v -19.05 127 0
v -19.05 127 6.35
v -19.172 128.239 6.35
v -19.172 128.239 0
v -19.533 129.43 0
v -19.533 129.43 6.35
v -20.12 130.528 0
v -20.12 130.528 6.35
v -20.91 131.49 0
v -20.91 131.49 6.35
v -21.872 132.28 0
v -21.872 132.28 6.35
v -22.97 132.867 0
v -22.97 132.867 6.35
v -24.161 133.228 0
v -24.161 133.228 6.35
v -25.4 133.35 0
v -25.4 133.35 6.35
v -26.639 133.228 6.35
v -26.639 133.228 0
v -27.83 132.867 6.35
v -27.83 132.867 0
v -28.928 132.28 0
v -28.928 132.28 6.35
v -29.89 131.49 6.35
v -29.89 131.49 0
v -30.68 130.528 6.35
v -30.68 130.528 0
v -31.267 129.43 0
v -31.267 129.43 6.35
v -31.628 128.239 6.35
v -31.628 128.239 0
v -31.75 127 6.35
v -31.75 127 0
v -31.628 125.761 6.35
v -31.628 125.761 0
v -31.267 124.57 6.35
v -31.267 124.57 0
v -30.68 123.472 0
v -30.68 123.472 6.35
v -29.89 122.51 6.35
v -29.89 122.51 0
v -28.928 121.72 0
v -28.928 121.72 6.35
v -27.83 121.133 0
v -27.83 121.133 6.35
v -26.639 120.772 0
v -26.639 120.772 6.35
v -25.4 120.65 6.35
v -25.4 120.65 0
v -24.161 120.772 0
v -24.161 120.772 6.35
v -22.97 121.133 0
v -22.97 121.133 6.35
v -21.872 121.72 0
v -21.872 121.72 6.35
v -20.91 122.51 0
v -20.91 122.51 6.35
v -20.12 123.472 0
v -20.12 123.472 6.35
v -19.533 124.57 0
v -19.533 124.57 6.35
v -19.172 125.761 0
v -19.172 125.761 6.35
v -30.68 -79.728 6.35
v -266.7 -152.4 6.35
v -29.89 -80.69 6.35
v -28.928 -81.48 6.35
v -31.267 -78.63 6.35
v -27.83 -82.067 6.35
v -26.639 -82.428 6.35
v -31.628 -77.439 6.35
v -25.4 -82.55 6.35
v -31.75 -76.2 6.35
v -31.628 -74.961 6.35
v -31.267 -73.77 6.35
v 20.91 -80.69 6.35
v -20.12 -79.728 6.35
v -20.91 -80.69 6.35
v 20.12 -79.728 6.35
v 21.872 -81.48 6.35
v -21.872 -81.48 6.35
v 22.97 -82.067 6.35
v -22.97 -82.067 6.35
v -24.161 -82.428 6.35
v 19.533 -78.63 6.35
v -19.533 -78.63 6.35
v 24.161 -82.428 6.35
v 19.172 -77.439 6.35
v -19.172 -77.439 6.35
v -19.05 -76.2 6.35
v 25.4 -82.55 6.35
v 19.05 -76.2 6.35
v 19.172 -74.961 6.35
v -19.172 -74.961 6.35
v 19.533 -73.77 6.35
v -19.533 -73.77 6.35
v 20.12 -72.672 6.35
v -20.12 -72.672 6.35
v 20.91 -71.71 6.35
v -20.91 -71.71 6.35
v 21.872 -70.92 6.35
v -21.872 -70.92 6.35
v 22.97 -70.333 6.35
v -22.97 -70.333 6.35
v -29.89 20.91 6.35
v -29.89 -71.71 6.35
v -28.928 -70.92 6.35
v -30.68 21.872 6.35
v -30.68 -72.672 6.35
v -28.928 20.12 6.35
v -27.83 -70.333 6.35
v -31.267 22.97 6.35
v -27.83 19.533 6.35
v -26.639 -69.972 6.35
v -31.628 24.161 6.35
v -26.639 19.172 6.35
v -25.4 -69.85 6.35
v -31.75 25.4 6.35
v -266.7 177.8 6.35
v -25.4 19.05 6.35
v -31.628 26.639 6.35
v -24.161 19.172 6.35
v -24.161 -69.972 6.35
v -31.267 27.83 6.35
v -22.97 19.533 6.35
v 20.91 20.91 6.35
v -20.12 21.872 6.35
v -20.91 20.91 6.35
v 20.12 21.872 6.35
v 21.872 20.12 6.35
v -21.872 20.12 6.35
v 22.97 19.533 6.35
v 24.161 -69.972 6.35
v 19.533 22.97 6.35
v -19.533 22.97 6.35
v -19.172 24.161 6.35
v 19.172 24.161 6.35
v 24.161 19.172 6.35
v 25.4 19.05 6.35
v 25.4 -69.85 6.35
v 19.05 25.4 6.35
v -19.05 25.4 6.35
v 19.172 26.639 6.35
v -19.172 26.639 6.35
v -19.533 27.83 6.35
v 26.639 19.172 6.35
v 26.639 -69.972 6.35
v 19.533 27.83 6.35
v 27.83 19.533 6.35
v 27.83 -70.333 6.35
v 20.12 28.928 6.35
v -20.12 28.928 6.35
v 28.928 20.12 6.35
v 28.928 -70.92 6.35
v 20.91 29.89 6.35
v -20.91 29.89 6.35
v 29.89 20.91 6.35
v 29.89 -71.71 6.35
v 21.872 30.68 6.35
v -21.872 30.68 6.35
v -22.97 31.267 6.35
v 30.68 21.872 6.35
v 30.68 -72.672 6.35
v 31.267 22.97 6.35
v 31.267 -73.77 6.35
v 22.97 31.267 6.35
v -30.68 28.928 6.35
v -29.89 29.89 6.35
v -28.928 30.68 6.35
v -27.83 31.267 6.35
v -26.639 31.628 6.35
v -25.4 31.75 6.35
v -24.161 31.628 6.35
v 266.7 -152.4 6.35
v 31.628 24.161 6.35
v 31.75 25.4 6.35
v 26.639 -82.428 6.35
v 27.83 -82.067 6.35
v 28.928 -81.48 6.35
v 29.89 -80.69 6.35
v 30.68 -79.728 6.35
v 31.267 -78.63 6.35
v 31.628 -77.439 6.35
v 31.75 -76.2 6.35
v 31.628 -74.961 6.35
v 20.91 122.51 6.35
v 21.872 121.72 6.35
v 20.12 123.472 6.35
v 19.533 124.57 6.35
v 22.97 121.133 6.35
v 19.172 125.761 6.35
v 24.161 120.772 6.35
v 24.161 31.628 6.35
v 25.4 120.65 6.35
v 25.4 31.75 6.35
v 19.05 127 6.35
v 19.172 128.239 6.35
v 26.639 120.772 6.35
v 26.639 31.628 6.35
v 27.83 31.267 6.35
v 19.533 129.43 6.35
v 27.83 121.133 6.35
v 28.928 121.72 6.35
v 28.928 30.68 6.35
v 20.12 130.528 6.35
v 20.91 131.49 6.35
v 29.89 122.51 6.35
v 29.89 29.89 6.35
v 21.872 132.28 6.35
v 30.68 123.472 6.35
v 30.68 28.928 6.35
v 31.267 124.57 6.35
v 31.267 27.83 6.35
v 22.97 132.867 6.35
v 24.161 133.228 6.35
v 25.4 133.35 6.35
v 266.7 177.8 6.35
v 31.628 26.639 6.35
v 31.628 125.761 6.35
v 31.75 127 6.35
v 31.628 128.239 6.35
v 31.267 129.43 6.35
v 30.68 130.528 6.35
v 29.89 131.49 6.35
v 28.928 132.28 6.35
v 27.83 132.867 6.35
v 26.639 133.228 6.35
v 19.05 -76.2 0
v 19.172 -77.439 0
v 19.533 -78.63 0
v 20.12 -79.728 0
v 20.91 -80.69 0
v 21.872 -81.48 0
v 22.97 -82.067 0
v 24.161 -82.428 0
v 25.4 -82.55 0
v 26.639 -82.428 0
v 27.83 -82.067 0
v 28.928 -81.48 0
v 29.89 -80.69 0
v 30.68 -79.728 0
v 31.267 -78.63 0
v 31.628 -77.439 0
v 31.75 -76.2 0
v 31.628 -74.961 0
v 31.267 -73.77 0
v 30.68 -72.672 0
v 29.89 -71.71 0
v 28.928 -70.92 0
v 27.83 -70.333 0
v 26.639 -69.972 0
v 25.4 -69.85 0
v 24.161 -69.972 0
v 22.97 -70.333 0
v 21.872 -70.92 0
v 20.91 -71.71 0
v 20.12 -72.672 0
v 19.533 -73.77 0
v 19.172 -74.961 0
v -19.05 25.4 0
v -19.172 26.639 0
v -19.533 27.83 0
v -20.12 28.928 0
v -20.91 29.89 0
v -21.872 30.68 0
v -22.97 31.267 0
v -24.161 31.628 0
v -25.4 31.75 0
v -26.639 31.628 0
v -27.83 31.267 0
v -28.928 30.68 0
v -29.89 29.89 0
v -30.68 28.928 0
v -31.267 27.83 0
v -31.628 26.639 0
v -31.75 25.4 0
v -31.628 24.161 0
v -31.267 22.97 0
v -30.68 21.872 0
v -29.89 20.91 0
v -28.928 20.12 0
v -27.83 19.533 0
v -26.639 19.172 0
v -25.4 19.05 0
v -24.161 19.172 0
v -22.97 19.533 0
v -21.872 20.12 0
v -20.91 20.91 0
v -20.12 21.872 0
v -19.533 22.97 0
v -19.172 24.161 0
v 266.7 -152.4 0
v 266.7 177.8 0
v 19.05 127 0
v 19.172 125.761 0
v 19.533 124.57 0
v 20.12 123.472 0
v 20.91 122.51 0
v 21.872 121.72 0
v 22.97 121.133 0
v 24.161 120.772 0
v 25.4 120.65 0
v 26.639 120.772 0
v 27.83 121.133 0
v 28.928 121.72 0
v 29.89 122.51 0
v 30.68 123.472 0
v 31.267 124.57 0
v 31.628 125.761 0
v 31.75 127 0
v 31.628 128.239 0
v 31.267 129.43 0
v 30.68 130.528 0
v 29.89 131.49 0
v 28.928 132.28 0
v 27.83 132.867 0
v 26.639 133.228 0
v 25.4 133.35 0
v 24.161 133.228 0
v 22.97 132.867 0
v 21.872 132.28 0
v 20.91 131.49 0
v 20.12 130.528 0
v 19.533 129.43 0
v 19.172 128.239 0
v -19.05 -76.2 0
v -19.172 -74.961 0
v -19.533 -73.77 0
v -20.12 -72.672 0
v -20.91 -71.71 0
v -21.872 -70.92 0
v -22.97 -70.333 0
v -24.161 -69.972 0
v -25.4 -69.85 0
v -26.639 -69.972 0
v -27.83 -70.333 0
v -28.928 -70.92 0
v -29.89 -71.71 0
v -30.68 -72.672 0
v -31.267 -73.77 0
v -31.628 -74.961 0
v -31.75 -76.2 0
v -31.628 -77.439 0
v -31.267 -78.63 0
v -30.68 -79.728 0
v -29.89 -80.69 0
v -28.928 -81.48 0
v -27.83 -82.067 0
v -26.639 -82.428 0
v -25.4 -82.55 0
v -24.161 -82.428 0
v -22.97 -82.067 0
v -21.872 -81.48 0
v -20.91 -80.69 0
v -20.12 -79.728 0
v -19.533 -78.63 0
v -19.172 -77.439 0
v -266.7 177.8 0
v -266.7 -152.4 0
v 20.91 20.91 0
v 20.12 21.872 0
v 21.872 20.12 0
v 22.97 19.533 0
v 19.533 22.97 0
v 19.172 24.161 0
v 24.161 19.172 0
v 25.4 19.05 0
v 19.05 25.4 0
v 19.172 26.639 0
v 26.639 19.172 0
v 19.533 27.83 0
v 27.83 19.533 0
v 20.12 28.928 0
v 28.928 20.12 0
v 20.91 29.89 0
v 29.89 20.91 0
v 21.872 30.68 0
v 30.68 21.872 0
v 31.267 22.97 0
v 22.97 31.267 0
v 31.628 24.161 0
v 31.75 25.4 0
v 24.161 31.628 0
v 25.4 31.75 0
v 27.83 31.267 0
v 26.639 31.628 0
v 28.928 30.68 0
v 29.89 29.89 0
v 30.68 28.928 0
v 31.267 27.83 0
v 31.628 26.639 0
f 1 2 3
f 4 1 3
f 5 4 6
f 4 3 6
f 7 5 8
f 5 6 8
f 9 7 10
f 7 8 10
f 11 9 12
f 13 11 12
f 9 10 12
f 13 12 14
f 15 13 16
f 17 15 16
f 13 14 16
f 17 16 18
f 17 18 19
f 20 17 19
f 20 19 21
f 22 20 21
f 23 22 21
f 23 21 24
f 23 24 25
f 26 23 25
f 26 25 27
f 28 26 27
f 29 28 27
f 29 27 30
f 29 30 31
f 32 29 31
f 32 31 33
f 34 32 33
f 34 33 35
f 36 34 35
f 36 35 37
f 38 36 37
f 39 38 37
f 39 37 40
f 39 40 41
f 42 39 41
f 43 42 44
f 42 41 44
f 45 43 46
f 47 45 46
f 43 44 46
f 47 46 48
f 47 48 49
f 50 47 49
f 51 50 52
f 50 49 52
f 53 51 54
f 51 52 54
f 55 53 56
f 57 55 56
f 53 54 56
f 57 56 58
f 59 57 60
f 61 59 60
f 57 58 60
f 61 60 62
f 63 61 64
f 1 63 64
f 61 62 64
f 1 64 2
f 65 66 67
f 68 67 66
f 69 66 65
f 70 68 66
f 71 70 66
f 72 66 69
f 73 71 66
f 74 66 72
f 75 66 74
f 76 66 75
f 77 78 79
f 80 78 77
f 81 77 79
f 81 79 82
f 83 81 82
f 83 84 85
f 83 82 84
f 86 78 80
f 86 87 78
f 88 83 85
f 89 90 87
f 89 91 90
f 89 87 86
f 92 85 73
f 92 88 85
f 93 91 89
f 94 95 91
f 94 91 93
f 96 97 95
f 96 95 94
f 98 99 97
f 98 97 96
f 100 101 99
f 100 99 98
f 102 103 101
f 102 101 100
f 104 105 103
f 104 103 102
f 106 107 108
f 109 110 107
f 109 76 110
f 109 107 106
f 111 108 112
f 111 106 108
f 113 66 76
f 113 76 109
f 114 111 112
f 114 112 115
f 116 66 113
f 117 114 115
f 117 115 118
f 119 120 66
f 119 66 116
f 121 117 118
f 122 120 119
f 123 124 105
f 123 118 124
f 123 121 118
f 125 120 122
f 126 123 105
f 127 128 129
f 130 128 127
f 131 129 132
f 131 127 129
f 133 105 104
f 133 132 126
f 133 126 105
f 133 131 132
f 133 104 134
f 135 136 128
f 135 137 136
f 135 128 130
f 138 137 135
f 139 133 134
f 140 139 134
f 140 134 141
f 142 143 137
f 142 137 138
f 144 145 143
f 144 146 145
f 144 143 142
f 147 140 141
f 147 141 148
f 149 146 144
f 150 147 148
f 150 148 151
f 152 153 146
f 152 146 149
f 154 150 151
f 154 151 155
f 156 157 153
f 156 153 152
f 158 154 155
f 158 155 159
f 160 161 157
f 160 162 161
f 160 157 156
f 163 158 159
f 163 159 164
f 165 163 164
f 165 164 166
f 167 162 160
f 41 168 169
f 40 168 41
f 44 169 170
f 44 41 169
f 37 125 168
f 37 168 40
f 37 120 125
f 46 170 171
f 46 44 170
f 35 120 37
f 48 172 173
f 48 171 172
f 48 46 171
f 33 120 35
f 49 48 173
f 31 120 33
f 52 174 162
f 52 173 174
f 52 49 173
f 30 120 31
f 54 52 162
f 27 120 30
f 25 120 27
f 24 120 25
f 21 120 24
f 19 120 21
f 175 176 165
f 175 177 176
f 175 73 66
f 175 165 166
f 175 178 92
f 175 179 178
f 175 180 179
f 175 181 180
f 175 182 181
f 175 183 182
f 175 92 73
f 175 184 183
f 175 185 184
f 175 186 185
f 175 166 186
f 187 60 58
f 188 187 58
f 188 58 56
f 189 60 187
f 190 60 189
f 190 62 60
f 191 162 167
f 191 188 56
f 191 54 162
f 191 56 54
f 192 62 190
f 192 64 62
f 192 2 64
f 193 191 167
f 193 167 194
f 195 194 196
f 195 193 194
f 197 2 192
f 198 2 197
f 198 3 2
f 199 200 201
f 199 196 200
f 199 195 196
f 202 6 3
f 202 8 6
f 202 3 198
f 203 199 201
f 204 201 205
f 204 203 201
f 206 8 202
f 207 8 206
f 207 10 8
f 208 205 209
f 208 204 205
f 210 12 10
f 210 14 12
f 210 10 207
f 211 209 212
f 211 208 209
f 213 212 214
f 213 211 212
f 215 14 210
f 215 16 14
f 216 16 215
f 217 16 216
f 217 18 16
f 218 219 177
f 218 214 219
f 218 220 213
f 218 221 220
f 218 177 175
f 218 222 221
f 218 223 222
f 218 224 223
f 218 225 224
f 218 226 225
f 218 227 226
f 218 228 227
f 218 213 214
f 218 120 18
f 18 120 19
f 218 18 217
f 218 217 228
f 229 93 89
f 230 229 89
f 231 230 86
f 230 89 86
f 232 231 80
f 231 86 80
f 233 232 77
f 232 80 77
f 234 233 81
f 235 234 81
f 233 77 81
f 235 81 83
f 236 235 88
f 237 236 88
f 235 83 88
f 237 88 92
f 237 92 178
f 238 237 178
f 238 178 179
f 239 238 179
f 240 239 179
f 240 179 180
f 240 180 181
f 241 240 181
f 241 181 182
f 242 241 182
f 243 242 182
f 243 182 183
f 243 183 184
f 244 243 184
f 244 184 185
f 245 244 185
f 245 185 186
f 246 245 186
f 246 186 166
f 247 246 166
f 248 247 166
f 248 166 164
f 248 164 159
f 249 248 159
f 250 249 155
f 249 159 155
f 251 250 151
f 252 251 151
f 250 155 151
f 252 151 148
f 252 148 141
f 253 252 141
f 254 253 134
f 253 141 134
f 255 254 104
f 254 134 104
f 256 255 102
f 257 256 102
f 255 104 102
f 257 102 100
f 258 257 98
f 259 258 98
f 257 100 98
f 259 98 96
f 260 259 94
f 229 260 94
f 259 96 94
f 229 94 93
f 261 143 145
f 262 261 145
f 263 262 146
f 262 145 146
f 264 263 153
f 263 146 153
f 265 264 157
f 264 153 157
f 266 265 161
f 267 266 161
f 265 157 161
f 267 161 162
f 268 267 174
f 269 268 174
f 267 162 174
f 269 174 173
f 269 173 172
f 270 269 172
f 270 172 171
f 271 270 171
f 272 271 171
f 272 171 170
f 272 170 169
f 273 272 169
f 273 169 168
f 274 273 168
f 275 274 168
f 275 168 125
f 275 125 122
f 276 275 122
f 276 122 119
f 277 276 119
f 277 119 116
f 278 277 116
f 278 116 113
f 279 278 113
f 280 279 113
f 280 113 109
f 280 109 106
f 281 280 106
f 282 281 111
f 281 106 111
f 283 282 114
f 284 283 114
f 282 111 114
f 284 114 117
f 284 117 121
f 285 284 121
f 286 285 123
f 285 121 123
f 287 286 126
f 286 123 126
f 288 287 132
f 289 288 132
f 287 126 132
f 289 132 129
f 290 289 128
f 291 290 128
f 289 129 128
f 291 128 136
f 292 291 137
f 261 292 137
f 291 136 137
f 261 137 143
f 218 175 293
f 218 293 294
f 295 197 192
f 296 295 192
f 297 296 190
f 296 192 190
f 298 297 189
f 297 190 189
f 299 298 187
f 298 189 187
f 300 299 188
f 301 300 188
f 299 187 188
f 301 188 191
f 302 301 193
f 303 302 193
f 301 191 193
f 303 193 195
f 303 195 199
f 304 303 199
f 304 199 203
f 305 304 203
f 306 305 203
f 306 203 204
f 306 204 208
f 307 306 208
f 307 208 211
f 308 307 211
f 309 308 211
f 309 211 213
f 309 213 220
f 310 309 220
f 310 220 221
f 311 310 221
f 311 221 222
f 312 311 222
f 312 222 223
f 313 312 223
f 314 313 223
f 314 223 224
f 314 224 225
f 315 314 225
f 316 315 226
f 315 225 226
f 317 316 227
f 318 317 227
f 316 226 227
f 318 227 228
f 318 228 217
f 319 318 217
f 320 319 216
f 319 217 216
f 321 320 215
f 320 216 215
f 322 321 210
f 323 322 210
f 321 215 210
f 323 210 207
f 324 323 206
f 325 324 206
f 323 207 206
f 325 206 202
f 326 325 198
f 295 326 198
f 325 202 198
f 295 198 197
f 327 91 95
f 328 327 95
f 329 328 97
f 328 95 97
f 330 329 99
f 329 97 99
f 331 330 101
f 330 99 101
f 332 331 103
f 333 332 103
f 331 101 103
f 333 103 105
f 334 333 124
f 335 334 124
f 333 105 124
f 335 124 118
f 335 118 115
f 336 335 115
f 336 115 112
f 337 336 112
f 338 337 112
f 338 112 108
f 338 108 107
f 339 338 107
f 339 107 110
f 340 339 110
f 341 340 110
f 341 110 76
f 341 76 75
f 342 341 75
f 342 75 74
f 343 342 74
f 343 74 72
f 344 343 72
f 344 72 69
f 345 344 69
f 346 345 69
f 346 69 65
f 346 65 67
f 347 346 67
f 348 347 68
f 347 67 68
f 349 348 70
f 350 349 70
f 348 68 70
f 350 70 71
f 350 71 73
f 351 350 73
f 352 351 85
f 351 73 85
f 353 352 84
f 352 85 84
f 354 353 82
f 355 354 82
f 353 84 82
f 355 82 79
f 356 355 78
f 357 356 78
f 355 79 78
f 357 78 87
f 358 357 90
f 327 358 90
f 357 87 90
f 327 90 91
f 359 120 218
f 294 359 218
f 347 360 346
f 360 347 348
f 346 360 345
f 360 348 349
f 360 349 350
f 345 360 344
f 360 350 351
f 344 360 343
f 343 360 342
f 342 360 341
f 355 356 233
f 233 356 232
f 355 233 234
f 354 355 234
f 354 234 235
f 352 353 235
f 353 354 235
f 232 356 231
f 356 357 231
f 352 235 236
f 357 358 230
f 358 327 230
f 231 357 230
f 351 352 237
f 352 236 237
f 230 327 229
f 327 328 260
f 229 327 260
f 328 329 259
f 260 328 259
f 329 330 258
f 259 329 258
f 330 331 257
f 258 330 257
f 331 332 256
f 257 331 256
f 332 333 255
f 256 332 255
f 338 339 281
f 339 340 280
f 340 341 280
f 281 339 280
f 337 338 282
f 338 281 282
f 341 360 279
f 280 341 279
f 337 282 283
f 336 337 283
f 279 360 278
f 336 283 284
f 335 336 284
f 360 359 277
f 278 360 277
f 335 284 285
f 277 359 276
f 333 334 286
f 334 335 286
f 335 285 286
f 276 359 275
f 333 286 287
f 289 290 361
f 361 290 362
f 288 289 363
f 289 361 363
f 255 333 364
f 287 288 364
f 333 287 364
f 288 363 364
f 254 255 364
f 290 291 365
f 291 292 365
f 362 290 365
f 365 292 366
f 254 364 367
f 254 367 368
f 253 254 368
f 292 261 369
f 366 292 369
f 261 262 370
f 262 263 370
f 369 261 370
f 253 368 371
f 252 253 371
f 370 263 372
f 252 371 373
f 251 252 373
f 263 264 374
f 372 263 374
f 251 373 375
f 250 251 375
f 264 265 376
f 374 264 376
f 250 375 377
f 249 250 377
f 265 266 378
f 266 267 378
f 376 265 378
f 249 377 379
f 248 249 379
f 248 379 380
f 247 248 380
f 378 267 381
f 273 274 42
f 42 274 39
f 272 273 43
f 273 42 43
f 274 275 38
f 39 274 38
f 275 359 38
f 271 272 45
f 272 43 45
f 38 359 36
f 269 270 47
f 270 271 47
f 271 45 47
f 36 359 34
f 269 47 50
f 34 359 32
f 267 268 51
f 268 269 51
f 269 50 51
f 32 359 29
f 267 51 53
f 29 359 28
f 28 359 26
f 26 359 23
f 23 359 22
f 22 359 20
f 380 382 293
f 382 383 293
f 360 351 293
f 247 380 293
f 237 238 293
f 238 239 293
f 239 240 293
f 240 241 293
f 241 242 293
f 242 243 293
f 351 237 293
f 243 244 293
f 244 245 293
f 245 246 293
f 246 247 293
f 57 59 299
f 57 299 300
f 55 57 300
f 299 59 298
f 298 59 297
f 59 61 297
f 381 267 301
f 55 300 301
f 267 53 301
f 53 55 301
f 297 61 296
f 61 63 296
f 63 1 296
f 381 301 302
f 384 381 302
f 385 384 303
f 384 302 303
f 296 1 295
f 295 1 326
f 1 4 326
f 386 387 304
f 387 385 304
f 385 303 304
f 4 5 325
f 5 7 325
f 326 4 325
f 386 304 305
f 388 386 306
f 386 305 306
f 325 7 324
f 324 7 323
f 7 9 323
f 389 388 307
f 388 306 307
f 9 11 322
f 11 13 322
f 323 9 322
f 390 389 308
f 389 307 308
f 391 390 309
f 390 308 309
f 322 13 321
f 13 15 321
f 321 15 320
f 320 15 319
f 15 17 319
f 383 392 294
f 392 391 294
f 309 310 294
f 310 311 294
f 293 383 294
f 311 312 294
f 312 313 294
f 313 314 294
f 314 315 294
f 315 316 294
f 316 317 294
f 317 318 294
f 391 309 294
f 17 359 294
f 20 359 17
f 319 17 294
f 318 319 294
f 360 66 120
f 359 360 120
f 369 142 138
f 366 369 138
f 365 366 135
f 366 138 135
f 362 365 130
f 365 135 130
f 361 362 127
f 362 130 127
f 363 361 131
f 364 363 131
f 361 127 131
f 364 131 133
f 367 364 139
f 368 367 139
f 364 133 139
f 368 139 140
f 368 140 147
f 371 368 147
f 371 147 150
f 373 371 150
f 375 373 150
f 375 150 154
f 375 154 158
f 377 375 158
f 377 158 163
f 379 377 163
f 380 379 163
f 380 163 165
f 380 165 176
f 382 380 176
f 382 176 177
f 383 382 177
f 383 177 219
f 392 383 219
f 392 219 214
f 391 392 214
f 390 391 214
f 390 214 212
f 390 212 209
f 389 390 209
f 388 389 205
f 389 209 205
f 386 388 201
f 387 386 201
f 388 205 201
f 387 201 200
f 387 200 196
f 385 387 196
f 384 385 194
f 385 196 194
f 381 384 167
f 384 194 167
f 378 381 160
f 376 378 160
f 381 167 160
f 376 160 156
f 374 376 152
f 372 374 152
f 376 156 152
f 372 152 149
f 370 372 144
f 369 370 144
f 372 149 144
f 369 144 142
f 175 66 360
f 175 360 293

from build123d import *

# Parameters (mm, degrees)
SKETCH1_W           = 254
SKETCH1_H           = 152.4
SKETCH1_R           = 53.34
BOSS_EXTRUDE1_DEPTH = 6.35
BOSS_EXTRUDE2_START = -6.35
SKETCH13_R          = 53.34
BOSS_EXTRUDE2_DEPTH = 6.35
SKETCH21_W          = 431.8
SKETCH21_H          = 279.4
SKETCH21_W_2        = 254
SKETCH21_H_2        = 152.4
BOSS_EXTRUDE5_DEPTH = 6.35
SKETCH19_R          = 6.35
CUT_EXTRUDE5_DEPTH  = 265.346160366
SKETCH25_W          = 533.4
SKETCH25_H          = 330.2
SKETCH25_W_2        = 431.8
SKETCH25_H_2        = 279.4
BOSS_EXTRUDE7_DEPTH = 6.35


with BuildPart() as part:
    # Sketch1 → Boss-Extrude1 (new body)
    with BuildSketch(Plane.XY):
        Rectangle(SKETCH1_W, SKETCH1_H)
        Circle(SKETCH1_R, mode=Mode.SUBTRACT)
    extrude(amount=BOSS_EXTRUDE1_DEPTH)

    # Sketch13 → Boss-Extrude2 (add)
    with BuildSketch(Plane.XY.offset(6.35).offset(BOSS_EXTRUDE2_START)):
        Circle(SKETCH13_R)
    extrude(amount=BOSS_EXTRUDE2_DEPTH)

    # Sketch21 → Boss-Extrude5 (add)
    with BuildSketch(Plane.XY.offset(6.35)):
        with Locations((0, 12.7)):
            Rectangle(SKETCH21_W, SKETCH21_H)
        Rectangle(SKETCH21_W_2, SKETCH21_H_2, mode=Mode.SUBTRACT)
    extrude(amount=-BOSS_EXTRUDE5_DEPTH)

    # Sketch19 → Cut-Extrude5 (cut, through all)
    with BuildSketch(Plane.XY.offset(6.35)):
        with Locations((-25.4, 127)):
            Circle(SKETCH19_R)
        with Locations((-25.4, 25.4)):
            Circle(SKETCH19_R)
        with Locations(Location((25.4, 25.4, 0), (0, 0, 180))):
            Circle(SKETCH19_R)
        with Locations(Location((25.4, 127, 0), (0, 0, 180))):
            Circle(SKETCH19_R)
        with Locations((-25.4, -76.2)):
            Circle(SKETCH19_R)
        with Locations(Location((25.4, -76.2, 0), (0, 0, 180))):
            Circle(SKETCH19_R)
    extrude(amount=-CUT_EXTRUDE5_DEPTH, mode=Mode.SUBTRACT)

    # Sketch25 → Boss-Extrude7 (add)
    with BuildSketch(Plane.XY.offset(6.35)):
        with Locations((0, 12.7)):
            Rectangle(SKETCH25_W, SKETCH25_H)
        with Locations((0, 12.7)):
            Rectangle(SKETCH25_W_2, SKETCH25_H_2, mode=Mode.SUBTRACT)
    extrude(amount=-BOSS_EXTRUDE7_DEPTH)


solid = part.part
